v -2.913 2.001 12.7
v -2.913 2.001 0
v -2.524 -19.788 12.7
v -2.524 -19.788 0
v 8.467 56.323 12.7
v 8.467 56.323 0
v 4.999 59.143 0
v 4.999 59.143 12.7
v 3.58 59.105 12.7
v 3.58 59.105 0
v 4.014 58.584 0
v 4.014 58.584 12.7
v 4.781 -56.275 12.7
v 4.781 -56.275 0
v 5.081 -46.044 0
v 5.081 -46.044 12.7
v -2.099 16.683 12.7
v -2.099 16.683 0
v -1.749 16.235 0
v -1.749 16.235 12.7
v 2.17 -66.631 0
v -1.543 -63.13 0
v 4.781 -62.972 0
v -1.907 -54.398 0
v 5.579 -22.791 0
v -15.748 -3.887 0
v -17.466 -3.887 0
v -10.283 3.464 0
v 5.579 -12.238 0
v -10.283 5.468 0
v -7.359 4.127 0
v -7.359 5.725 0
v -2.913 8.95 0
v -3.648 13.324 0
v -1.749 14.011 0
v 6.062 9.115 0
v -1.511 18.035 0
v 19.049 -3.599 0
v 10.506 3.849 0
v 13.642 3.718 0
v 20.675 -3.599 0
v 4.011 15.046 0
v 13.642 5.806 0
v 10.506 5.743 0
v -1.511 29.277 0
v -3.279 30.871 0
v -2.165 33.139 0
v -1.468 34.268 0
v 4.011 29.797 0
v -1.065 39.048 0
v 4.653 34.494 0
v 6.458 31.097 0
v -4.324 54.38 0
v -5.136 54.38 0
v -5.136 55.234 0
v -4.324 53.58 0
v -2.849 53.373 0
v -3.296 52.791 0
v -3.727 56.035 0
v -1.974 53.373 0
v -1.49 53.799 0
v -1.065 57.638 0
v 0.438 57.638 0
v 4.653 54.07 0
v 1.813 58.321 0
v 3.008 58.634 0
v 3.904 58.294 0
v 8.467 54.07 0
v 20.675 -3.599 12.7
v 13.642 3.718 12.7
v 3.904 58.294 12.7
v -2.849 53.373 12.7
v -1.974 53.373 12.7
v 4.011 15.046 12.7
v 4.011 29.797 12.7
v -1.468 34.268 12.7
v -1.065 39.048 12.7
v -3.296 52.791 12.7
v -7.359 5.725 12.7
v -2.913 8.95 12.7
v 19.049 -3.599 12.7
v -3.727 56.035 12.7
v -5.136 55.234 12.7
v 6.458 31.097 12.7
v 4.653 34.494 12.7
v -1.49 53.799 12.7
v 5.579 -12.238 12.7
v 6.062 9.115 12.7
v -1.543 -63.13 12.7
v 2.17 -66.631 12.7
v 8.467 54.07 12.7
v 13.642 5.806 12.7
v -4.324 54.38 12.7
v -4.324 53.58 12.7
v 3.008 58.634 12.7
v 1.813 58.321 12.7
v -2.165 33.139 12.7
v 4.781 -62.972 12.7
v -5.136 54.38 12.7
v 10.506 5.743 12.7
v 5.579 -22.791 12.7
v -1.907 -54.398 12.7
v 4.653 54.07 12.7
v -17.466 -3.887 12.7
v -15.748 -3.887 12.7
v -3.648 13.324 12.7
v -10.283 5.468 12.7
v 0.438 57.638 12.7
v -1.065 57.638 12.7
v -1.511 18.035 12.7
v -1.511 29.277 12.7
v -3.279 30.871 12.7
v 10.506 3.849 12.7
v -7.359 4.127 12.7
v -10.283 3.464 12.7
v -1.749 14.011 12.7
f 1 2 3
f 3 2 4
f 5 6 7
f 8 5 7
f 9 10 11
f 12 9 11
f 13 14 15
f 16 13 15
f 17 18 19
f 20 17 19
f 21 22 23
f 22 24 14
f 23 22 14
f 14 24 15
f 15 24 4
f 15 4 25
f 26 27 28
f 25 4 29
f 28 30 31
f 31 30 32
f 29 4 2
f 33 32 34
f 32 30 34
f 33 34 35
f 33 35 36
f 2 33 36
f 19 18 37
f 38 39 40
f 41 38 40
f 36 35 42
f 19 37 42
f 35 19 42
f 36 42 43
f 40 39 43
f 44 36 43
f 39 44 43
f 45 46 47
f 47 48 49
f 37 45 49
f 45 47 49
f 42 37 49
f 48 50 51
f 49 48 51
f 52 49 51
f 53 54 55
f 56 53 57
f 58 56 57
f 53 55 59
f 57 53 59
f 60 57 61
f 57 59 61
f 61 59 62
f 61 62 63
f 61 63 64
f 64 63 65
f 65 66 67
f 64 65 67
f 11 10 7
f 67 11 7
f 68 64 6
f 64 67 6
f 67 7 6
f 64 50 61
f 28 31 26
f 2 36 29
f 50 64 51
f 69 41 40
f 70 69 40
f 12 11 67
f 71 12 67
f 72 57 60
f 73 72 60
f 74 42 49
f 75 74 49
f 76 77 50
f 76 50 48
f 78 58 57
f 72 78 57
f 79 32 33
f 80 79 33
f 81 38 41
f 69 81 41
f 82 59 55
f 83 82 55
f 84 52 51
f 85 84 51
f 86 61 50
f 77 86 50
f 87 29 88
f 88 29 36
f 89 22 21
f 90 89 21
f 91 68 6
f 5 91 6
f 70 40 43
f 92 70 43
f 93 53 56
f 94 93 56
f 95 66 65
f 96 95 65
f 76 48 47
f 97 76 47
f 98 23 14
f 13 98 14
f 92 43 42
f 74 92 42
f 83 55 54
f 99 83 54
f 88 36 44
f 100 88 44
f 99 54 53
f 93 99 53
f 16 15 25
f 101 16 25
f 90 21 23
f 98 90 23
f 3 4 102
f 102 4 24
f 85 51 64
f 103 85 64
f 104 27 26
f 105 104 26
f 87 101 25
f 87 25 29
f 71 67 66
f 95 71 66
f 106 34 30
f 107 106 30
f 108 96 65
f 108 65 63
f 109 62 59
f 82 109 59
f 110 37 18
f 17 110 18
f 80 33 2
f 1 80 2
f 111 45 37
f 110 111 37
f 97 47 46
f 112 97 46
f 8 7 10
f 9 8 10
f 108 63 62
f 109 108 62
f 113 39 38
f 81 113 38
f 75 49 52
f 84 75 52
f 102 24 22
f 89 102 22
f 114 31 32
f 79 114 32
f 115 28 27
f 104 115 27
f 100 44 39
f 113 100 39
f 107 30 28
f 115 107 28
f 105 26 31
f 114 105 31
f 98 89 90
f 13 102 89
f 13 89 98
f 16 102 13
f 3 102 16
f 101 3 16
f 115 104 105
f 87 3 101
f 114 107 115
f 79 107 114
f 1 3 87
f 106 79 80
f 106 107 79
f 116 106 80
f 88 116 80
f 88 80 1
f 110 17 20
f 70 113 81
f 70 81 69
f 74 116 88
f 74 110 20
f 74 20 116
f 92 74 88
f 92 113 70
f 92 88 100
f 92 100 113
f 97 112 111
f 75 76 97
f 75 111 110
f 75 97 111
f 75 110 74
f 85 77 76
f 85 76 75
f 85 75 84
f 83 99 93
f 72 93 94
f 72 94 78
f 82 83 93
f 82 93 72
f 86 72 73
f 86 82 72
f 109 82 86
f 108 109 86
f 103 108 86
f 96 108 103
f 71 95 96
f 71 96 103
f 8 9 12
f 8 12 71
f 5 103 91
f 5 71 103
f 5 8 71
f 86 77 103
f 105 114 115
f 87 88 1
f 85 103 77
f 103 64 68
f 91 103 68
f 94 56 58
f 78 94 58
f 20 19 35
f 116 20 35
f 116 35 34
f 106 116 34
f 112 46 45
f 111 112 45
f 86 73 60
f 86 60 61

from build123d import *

# Parameters (mm, degrees)
F1_DEPTH = 12.7


with BuildPart() as f1:
    # F0 (on Top) → F1 (new body)
    with BuildSketch(Plane.XY):
        Polygon((8.4674097598, 56.3226677477), (4.9993731081, 59.1430924833), (3.5796526354, 59.105347842), (4.0142790642, 58.5837887803), (3.9040301926, 58.2936815917), (3.0076738913, 58.6343221366), (1.81281392, 58.3214089274), (0.4375161952, 57.63842538), (0, 57.63842538), (-1.0647438467, 57.63842538), (-3.7269797176, 56.0346469283), (-5.1362086087, 55.2338398993), (-5.1362086087, 54.3800778687), (-4.324192436, 54.3800778687), (-4.324192436, 53.5804792602), (-3.2959955279, 52.7911260724), (-2.8494205326, 53.3728264272), (-1.9739218988, 53.3728264272), (-1.4901272083, 53.7990161207), (-1.4361526119, 51.9273541868), (-1.0647438467, 39.0481166542), (-1.4684260823, 34.2683680356), (-2.1647270769, 33.138576895), (-3.2786394004, 30.8706443757), (-1.5108085936, 29.2773563415), (-1.5108085936, 18.0350095034), (-2.0992092323, 16.6827999055), (-1.7486788565, 16.2351131439), (-1.7486788565, 14.0109397471), (-3.6478310358, 13.3241694421), (-10.2832335979, 5.4679820314), (-10.2832335979, 3.4643800464), (-17.465846613, -3.8865045644), (-15.7476849854, -3.8865045644), (-7.3585305363, 4.1265715845), (-7.3585305363, 5.7251015678), (-2.9132614987, 8.9498246089), (-2.9132614987, 2.0007098744), (-2.5243267883, -19.7883937508), (-1.9065504894, -54.3977804482), (-1.5426465543, -63.1300359964), (2.1701699588, -66.6309818625), (4.7807293013, -62.9719868302), (4.7807293013, -56.274600327), (5.0807259977, -46.0444651544), (5.579222925, -22.7906536311), (5.579222925, -12.2377127409), (6.0616787523, 9.1150859371), (10.5058038607, 5.7430174202), (10.5058038607, 3.8492596457), (19.0487038344, -3.5993366037), (20.6745713949, -3.5993366037), (13.642212376, 3.7180308718), (13.642212376, 5.8058663271), (4.0112765072, 15.0460293517), (4.0112765072, 29.7966579315), (6.4584943466, 31.0973599553), (4.653096199, 34.4941429794), (4.653096199, 50.1591525972), (4.653096199, 54.0697947145), (8.4674097598, 54.0697947145), align=None)
    extrude(amount=F1_DEPTH)


solid = f1.part
